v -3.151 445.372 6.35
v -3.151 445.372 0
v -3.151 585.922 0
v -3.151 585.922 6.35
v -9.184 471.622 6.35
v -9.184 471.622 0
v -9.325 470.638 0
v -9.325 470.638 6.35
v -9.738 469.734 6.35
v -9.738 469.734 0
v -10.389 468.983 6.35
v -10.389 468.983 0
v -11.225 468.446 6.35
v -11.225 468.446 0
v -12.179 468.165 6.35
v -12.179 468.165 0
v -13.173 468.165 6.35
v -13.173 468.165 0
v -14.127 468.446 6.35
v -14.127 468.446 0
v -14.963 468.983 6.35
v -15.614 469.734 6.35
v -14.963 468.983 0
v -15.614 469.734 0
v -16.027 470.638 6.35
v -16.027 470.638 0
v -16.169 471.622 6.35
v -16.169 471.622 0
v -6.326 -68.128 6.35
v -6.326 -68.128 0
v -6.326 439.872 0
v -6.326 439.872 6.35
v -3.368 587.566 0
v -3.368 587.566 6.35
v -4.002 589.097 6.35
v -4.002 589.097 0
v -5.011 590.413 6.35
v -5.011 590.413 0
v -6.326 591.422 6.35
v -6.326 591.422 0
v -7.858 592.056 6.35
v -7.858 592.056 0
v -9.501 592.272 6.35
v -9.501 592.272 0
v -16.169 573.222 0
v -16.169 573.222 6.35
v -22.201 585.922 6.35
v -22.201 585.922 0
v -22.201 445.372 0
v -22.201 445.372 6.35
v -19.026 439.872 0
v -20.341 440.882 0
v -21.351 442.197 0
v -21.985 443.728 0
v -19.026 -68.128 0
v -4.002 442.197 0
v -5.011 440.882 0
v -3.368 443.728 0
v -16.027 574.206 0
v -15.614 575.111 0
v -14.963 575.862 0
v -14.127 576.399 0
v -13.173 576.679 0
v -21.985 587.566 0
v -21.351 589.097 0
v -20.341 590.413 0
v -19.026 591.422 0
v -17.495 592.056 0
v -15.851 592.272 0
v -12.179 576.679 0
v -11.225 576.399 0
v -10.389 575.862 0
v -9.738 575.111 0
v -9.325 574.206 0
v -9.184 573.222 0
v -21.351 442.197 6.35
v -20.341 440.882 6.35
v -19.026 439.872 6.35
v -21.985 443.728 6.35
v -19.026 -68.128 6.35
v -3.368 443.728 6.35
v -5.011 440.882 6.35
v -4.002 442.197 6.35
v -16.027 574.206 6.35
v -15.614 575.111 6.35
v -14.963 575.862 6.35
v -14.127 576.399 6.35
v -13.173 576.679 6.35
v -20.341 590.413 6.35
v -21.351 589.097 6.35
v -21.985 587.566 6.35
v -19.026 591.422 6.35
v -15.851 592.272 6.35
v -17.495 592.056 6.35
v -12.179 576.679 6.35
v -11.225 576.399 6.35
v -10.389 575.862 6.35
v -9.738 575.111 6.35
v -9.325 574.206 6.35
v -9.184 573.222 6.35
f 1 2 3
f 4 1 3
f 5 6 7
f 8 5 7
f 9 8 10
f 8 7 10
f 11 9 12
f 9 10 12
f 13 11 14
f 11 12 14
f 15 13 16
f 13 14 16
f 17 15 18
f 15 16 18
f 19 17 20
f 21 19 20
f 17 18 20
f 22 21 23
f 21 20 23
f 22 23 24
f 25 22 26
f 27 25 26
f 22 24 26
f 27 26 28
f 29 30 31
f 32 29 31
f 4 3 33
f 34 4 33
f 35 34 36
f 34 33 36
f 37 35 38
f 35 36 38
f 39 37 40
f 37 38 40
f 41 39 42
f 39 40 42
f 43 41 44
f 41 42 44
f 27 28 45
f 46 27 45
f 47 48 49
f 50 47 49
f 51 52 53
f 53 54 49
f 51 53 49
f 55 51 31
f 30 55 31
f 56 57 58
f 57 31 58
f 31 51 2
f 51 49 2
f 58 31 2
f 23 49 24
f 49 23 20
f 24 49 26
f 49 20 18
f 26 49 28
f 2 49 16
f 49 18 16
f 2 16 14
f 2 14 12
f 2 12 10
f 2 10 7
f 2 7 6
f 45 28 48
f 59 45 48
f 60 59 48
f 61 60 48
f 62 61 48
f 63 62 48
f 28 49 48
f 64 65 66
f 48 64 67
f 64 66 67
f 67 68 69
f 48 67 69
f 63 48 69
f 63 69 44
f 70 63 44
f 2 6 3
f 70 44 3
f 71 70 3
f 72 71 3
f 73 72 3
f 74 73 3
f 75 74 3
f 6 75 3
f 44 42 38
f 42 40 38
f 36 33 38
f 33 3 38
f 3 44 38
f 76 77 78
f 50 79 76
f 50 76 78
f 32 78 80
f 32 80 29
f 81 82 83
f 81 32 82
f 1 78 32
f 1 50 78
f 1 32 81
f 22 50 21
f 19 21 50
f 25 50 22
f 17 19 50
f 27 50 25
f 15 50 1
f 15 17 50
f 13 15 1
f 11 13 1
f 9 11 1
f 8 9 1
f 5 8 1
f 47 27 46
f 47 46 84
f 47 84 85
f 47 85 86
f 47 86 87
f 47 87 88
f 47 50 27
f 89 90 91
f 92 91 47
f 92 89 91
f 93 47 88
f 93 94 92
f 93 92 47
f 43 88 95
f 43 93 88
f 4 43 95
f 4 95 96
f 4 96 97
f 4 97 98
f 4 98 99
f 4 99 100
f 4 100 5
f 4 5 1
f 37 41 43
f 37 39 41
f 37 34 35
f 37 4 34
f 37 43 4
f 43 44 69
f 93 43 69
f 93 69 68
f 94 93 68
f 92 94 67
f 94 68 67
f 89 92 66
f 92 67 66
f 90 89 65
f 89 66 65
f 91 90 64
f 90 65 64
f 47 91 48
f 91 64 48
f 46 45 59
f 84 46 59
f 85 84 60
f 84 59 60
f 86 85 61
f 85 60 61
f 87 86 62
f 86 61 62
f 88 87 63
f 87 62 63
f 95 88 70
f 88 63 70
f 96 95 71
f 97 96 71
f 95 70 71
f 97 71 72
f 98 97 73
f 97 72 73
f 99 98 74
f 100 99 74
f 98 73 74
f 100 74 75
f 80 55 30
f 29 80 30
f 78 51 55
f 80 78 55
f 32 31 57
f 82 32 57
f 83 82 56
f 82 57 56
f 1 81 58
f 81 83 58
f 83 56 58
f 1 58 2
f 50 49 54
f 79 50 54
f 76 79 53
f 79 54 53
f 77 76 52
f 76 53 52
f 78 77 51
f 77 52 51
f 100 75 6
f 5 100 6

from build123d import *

# Parameters (mm, degrees)
F1_DEPTH    = 6.35
F2_T1_DEPTH = 38.1
F2_T3_DEPTH = 33.8463065702
F4_DEPTH    = 6.351


# Not quite as in the source:
# - a fillet or chamfer that OpenCascade refuses, or shapes differently, is made with other operations: its cross-section is extruded or revolved along the edge and cut away or added


with BuildPart() as f1:
    # F0 (on Top) → F1 (new body)
    with BuildSketch(Plane.XY):
        Polygon((-3.1513119073, 592.2723904558), (-22.2013119073, 592.2723904558), (-22.2013119073, 439.8723904558), (-19.0263119073, 439.8723904558), (-19.0263119073, -68.1276095442), (-6.3263119073, -68.1276095442), (-6.3263119073, 439.8723904558), (-3.1513119073, 439.8723904558), align=None)
    extrude(amount=F1_DEPTH)

    # F2: fillet of radius 6.35 on 4 edges, made by hand

    # F2_s2 → F2_t1 (cut)
    with BuildSketch(Plane.XY.offset(-15.875)):
        with BuildLine():
            ThreePointArc((-3.1513119073, 585.9223904558), (-5.0111838468, 590.4125185164), (-9.5013119073, 592.2723904558))
            Line((-9.5013119073, 592.2723904558), (-3.1513119073, 592.2723904558))
            Line((-3.1513119073, 592.2723904558), (-3.1513119073, 585.9223904558))
        make_face()
        with BuildLine():
            ThreePointArc((-15.8513119073, 592.2723904558), (-20.3414399678, 590.4125185164), (-22.2013119073, 585.9223904558))
            Line((-22.2013119073, 585.9223904558), (-22.2013119073, 592.2723904558))
            Line((-22.2013119073, 592.2723904558), (-15.8513119073, 592.2723904558))
        make_face()
    extrude(amount=F2_T1_DEPTH, mode=Mode.SUBTRACT)

    # F2_s4 → F2_t3 (cut)
    with BuildSketch(Plane.XY.offset(-13.7481532851)):
        with BuildLine():
            ThreePointArc((-22.2013119073, 445.3716517699), (-21.3505732213, 442.1966517699), (-19.0263119073, 439.8723904558))
            Line((-19.0263119073, 439.8723904558), (-22.2013119073, 439.8723904558))
            Line((-22.2013119073, 439.8723904558), (-22.2013119073, 445.3716517699))
        make_face()
        with BuildLine():
            ThreePointArc((-6.3263119073, 439.8723904558), (-4.0020505933, 442.1966517699), (-3.1513119073, 445.3716517699))
            Line((-3.1513119073, 445.3716517699), (-3.1513119073, 439.8723904558))
            Line((-3.1513119073, 439.8723904558), (-6.3263119073, 439.8723904558))
        make_face()
    extrude(amount=F2_T3_DEPTH, mode=Mode.SUBTRACT)

    # F3 (on face) → F4 (cut, through all)
    with BuildSketch(Plane(origin=(0, 0, 0), x_dir=(1, 0, 0), z_dir=(0, 0, -1))):
        with BuildLine():
            Line((-16.1688119073, -471.6223904558), (-16.1688119073, -573.2223904558))
            ThreePointArc((-16.1688119073, -573.2223904558), (-12.6763119073, -576.7148904558), (-9.1838119073, -573.2223904558))
            Line((-9.1838119073, -573.2223904558), (-9.1838119073, -471.6223904558))
            ThreePointArc((-9.1838119073, -471.6223904558), (-12.6763119073, -468.1298904558), (-16.1688119073, -471.6223904558))
        make_face()
    extrude(amount=-F4_DEPTH, mode=Mode.SUBTRACT)


solid = f1.part
